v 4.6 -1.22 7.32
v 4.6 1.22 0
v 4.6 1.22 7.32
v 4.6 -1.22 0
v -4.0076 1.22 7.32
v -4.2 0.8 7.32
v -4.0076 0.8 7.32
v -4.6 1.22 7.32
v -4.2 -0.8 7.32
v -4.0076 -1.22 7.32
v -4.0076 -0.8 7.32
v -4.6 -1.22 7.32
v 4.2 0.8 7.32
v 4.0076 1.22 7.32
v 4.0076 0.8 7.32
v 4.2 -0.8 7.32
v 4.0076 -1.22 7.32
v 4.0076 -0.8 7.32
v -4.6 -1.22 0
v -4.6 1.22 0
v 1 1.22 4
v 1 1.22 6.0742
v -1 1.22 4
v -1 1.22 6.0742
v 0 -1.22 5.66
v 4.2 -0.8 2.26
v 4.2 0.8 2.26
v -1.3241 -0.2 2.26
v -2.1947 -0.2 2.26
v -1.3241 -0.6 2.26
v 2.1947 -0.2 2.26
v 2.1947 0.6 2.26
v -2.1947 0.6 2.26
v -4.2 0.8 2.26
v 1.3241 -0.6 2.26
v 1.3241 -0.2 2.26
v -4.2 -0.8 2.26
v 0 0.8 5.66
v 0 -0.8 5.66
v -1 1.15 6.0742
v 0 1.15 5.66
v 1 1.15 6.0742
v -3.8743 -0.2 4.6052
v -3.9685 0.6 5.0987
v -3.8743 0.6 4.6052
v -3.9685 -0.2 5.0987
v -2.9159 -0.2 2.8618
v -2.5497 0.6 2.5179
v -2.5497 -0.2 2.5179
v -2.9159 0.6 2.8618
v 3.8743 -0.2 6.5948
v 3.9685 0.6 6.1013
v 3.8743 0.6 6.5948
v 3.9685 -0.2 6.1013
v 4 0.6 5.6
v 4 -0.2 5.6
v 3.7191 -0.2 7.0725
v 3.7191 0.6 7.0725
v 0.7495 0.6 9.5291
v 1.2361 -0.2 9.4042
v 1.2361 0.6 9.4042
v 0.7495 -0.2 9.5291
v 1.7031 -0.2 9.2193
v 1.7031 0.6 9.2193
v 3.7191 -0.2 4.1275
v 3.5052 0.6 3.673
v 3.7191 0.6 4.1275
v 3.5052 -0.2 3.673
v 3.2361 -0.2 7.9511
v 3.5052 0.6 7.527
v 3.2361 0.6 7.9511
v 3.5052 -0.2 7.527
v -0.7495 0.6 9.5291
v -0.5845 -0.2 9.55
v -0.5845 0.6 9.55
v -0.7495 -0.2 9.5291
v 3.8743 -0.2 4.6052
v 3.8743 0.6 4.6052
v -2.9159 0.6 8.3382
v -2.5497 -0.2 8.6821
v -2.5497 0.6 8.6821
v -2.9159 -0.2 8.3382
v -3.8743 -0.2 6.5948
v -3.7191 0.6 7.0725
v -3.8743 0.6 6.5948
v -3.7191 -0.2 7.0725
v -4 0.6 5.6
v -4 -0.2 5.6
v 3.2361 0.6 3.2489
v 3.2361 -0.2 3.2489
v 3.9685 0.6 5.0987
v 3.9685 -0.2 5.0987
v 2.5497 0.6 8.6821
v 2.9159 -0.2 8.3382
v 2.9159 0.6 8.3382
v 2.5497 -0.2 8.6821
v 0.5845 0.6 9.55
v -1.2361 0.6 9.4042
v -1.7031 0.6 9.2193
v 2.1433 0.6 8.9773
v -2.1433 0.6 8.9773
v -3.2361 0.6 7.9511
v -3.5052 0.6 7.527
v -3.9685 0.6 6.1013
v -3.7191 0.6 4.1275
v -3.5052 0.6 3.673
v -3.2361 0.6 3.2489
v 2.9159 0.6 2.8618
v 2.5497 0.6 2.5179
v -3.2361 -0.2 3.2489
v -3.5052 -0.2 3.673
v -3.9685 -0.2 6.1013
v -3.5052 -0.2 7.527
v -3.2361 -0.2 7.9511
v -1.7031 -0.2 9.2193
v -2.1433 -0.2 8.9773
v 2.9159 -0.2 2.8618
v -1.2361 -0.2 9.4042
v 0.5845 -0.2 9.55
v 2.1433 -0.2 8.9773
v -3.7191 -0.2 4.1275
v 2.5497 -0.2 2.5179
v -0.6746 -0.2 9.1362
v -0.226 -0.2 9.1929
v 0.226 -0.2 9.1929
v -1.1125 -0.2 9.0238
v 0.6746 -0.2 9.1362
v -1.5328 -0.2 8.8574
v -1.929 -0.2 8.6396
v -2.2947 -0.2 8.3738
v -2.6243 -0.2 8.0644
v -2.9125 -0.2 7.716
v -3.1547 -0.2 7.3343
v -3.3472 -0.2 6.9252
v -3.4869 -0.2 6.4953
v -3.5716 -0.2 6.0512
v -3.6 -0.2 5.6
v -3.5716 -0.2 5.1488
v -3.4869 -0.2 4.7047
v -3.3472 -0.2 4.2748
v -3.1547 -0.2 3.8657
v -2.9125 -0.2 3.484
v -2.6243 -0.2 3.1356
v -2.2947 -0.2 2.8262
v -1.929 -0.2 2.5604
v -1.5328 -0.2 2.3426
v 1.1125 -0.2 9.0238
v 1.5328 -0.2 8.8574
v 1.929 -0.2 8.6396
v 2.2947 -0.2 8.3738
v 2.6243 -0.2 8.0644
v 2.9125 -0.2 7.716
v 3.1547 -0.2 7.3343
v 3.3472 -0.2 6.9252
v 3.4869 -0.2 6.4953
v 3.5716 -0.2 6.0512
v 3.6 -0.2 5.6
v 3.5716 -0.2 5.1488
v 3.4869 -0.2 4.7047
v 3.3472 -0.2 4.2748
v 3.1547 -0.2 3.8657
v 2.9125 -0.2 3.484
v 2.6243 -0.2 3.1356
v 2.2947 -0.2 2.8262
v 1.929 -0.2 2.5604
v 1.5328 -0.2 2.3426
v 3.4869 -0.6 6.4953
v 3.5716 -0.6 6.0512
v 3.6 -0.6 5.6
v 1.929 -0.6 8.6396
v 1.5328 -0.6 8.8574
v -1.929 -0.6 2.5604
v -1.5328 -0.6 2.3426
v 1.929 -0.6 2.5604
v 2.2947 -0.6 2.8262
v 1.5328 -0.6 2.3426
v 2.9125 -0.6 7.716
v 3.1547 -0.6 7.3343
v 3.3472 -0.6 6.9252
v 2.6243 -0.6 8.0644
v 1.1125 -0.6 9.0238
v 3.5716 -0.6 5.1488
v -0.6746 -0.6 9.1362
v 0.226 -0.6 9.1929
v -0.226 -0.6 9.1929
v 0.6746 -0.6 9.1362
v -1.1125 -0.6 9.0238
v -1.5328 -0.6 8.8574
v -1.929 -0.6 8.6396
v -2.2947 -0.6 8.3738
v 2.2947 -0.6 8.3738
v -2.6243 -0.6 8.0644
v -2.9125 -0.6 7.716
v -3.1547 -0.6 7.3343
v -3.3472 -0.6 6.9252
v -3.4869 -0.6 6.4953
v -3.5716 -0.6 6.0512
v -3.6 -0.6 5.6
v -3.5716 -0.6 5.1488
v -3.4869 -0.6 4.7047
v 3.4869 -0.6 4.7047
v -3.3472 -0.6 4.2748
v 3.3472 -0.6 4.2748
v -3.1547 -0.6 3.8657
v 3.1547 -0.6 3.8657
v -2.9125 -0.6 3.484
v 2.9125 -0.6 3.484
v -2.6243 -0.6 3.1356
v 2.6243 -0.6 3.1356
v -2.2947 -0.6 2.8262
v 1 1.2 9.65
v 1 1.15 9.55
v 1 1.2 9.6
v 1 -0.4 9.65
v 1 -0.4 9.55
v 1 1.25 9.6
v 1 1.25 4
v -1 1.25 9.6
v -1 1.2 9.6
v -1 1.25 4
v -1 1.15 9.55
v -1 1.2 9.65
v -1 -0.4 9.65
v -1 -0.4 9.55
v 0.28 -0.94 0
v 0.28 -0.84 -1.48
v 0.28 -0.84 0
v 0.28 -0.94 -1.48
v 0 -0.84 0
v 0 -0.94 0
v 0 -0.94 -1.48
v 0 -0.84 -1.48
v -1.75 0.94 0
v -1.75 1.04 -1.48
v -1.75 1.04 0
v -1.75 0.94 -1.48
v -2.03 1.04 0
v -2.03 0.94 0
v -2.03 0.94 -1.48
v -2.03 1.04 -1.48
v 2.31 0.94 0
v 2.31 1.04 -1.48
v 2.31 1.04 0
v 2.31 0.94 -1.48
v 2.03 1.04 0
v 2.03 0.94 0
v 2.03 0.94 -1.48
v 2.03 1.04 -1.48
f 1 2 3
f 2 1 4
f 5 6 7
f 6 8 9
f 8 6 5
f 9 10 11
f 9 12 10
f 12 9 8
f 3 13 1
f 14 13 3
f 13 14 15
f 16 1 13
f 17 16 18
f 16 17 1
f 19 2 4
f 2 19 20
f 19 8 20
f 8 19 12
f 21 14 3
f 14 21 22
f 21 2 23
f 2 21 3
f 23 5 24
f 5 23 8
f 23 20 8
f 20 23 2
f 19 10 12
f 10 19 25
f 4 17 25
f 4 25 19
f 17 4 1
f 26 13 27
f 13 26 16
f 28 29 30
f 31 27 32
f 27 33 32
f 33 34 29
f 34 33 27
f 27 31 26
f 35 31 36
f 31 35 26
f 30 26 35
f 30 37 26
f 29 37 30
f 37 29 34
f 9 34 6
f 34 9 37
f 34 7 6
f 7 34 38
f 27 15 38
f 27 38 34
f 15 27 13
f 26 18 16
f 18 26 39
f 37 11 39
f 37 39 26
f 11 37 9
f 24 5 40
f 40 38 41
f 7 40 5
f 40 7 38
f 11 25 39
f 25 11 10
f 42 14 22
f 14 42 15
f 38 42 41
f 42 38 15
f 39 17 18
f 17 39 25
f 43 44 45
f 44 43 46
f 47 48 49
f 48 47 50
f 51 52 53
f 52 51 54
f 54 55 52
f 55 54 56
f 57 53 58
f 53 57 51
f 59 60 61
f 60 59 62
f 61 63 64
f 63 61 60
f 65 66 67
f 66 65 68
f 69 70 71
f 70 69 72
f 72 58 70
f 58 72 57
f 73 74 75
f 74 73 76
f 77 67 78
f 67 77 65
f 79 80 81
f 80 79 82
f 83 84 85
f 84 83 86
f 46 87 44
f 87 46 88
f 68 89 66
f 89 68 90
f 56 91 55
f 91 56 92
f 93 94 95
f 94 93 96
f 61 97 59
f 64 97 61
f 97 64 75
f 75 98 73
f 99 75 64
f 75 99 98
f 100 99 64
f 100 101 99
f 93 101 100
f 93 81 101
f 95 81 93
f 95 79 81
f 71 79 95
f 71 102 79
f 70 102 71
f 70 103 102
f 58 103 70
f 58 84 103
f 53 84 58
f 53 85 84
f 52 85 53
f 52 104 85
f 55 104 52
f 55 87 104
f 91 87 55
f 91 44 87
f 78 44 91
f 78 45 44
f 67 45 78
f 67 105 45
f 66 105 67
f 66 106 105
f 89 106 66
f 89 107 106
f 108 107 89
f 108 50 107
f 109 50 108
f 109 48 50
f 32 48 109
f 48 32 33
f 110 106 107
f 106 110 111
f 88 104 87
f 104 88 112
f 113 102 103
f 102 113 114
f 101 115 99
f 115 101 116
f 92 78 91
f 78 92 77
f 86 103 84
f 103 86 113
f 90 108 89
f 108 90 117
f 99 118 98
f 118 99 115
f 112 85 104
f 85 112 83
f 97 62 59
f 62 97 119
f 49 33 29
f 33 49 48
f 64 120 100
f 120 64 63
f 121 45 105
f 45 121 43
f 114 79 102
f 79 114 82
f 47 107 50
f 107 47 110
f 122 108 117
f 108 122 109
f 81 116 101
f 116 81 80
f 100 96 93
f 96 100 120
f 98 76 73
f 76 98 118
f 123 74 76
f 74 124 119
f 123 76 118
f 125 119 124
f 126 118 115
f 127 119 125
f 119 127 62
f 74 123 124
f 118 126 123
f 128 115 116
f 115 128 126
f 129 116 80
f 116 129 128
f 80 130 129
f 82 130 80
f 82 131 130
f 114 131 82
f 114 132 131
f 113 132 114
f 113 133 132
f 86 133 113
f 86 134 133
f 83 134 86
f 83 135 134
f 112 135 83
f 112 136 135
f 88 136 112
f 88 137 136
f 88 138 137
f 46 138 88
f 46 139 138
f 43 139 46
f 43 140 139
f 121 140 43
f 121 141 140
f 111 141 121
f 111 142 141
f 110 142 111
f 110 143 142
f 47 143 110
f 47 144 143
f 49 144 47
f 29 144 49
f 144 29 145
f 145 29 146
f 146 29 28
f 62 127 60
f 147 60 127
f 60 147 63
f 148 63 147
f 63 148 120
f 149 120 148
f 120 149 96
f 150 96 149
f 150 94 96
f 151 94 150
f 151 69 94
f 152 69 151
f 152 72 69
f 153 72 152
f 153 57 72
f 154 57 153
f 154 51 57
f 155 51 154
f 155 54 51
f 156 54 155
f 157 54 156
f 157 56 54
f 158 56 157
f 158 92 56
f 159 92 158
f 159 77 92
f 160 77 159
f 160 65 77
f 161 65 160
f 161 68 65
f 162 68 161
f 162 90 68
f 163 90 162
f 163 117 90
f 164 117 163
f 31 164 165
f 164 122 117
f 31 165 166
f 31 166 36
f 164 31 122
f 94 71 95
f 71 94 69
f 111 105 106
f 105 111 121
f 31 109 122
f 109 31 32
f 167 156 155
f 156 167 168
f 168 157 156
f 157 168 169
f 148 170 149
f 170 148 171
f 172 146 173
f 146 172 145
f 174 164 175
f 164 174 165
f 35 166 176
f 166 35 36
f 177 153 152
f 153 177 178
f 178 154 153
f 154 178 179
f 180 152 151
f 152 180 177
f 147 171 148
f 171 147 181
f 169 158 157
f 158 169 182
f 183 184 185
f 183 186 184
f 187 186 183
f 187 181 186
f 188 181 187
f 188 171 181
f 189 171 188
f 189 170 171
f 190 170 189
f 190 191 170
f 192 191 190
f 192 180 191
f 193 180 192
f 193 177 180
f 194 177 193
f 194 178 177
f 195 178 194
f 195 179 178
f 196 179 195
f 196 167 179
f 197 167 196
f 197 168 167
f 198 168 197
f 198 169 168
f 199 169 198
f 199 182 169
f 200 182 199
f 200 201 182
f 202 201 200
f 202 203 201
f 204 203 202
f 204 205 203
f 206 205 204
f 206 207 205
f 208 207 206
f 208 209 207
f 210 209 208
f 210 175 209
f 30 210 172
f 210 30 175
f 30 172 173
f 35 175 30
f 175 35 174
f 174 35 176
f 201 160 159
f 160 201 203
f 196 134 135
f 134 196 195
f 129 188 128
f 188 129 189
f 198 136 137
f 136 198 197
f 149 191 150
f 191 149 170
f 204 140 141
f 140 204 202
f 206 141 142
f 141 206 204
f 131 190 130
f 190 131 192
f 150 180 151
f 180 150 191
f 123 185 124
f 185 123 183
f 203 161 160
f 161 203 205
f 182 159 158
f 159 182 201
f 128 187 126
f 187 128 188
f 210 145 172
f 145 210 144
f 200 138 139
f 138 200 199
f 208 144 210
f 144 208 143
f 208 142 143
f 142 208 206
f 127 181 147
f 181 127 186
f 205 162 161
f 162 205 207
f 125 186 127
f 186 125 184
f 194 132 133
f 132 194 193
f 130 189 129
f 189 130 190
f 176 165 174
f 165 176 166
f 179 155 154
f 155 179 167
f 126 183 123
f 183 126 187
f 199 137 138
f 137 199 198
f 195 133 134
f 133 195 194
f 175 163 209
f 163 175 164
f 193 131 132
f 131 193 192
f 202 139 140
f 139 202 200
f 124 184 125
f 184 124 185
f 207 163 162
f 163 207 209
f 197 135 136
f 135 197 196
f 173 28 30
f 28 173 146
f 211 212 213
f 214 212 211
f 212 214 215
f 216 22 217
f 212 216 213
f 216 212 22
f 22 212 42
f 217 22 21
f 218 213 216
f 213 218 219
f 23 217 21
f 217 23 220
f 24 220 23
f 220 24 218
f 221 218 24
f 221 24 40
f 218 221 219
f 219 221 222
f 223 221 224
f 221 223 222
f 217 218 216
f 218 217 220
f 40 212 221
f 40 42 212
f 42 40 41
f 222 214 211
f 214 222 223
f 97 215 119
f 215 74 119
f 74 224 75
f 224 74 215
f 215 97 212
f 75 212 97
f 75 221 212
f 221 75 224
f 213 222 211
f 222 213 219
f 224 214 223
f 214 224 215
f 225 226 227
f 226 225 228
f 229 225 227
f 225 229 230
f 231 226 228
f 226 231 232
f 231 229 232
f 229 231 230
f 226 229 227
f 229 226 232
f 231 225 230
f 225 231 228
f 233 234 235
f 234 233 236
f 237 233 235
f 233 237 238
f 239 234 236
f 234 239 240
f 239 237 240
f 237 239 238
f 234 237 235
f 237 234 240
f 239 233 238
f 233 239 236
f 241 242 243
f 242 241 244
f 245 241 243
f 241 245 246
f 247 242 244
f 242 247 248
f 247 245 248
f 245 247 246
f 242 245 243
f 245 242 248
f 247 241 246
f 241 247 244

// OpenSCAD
module VBH2032_1() {
  $fn = 50;
  color("black") {
    translate([0, 0, 9.15]) {
      difference() {
        cube([23, 6.1, 18.3], center=true);
        translate([0, 0, 5])
          cube([21, 4, 17], center=true);
        translate([0, 5, 20])
          rotate([90, 0, 0])
            cylinder(d=30, h=10, $fn=8);
      }
    }
  }
  color("silver") {
    // coin
    translate([0, 1.5, 14])
      rotate([90, 0, 0]) {
        cylinder(d=20, h=2);
        cylinder(d=18, h=3);
    }
  }
  color("white") {
    translate([0, 3, 17])
      cube([5, 0.25, 14], center=true);
    translate([0, 1, 24])
      cube([5, 4, 0.25], center=true);
  }
  color("yellow") {
    translate([0, -2.35, -3.7])
      cube([0.7, 0.25, 3.7]);
    translate([-5.075, 2.35, -3.7])
      cube([0.7, 0.25, 3.7]);
    translate([5.075, 2.35, -3.7])
      cube([0.7, 0.25, 3.7]);
  }
}

scale([0.4, 0.4, 0.4])
  VBH2032_1();
